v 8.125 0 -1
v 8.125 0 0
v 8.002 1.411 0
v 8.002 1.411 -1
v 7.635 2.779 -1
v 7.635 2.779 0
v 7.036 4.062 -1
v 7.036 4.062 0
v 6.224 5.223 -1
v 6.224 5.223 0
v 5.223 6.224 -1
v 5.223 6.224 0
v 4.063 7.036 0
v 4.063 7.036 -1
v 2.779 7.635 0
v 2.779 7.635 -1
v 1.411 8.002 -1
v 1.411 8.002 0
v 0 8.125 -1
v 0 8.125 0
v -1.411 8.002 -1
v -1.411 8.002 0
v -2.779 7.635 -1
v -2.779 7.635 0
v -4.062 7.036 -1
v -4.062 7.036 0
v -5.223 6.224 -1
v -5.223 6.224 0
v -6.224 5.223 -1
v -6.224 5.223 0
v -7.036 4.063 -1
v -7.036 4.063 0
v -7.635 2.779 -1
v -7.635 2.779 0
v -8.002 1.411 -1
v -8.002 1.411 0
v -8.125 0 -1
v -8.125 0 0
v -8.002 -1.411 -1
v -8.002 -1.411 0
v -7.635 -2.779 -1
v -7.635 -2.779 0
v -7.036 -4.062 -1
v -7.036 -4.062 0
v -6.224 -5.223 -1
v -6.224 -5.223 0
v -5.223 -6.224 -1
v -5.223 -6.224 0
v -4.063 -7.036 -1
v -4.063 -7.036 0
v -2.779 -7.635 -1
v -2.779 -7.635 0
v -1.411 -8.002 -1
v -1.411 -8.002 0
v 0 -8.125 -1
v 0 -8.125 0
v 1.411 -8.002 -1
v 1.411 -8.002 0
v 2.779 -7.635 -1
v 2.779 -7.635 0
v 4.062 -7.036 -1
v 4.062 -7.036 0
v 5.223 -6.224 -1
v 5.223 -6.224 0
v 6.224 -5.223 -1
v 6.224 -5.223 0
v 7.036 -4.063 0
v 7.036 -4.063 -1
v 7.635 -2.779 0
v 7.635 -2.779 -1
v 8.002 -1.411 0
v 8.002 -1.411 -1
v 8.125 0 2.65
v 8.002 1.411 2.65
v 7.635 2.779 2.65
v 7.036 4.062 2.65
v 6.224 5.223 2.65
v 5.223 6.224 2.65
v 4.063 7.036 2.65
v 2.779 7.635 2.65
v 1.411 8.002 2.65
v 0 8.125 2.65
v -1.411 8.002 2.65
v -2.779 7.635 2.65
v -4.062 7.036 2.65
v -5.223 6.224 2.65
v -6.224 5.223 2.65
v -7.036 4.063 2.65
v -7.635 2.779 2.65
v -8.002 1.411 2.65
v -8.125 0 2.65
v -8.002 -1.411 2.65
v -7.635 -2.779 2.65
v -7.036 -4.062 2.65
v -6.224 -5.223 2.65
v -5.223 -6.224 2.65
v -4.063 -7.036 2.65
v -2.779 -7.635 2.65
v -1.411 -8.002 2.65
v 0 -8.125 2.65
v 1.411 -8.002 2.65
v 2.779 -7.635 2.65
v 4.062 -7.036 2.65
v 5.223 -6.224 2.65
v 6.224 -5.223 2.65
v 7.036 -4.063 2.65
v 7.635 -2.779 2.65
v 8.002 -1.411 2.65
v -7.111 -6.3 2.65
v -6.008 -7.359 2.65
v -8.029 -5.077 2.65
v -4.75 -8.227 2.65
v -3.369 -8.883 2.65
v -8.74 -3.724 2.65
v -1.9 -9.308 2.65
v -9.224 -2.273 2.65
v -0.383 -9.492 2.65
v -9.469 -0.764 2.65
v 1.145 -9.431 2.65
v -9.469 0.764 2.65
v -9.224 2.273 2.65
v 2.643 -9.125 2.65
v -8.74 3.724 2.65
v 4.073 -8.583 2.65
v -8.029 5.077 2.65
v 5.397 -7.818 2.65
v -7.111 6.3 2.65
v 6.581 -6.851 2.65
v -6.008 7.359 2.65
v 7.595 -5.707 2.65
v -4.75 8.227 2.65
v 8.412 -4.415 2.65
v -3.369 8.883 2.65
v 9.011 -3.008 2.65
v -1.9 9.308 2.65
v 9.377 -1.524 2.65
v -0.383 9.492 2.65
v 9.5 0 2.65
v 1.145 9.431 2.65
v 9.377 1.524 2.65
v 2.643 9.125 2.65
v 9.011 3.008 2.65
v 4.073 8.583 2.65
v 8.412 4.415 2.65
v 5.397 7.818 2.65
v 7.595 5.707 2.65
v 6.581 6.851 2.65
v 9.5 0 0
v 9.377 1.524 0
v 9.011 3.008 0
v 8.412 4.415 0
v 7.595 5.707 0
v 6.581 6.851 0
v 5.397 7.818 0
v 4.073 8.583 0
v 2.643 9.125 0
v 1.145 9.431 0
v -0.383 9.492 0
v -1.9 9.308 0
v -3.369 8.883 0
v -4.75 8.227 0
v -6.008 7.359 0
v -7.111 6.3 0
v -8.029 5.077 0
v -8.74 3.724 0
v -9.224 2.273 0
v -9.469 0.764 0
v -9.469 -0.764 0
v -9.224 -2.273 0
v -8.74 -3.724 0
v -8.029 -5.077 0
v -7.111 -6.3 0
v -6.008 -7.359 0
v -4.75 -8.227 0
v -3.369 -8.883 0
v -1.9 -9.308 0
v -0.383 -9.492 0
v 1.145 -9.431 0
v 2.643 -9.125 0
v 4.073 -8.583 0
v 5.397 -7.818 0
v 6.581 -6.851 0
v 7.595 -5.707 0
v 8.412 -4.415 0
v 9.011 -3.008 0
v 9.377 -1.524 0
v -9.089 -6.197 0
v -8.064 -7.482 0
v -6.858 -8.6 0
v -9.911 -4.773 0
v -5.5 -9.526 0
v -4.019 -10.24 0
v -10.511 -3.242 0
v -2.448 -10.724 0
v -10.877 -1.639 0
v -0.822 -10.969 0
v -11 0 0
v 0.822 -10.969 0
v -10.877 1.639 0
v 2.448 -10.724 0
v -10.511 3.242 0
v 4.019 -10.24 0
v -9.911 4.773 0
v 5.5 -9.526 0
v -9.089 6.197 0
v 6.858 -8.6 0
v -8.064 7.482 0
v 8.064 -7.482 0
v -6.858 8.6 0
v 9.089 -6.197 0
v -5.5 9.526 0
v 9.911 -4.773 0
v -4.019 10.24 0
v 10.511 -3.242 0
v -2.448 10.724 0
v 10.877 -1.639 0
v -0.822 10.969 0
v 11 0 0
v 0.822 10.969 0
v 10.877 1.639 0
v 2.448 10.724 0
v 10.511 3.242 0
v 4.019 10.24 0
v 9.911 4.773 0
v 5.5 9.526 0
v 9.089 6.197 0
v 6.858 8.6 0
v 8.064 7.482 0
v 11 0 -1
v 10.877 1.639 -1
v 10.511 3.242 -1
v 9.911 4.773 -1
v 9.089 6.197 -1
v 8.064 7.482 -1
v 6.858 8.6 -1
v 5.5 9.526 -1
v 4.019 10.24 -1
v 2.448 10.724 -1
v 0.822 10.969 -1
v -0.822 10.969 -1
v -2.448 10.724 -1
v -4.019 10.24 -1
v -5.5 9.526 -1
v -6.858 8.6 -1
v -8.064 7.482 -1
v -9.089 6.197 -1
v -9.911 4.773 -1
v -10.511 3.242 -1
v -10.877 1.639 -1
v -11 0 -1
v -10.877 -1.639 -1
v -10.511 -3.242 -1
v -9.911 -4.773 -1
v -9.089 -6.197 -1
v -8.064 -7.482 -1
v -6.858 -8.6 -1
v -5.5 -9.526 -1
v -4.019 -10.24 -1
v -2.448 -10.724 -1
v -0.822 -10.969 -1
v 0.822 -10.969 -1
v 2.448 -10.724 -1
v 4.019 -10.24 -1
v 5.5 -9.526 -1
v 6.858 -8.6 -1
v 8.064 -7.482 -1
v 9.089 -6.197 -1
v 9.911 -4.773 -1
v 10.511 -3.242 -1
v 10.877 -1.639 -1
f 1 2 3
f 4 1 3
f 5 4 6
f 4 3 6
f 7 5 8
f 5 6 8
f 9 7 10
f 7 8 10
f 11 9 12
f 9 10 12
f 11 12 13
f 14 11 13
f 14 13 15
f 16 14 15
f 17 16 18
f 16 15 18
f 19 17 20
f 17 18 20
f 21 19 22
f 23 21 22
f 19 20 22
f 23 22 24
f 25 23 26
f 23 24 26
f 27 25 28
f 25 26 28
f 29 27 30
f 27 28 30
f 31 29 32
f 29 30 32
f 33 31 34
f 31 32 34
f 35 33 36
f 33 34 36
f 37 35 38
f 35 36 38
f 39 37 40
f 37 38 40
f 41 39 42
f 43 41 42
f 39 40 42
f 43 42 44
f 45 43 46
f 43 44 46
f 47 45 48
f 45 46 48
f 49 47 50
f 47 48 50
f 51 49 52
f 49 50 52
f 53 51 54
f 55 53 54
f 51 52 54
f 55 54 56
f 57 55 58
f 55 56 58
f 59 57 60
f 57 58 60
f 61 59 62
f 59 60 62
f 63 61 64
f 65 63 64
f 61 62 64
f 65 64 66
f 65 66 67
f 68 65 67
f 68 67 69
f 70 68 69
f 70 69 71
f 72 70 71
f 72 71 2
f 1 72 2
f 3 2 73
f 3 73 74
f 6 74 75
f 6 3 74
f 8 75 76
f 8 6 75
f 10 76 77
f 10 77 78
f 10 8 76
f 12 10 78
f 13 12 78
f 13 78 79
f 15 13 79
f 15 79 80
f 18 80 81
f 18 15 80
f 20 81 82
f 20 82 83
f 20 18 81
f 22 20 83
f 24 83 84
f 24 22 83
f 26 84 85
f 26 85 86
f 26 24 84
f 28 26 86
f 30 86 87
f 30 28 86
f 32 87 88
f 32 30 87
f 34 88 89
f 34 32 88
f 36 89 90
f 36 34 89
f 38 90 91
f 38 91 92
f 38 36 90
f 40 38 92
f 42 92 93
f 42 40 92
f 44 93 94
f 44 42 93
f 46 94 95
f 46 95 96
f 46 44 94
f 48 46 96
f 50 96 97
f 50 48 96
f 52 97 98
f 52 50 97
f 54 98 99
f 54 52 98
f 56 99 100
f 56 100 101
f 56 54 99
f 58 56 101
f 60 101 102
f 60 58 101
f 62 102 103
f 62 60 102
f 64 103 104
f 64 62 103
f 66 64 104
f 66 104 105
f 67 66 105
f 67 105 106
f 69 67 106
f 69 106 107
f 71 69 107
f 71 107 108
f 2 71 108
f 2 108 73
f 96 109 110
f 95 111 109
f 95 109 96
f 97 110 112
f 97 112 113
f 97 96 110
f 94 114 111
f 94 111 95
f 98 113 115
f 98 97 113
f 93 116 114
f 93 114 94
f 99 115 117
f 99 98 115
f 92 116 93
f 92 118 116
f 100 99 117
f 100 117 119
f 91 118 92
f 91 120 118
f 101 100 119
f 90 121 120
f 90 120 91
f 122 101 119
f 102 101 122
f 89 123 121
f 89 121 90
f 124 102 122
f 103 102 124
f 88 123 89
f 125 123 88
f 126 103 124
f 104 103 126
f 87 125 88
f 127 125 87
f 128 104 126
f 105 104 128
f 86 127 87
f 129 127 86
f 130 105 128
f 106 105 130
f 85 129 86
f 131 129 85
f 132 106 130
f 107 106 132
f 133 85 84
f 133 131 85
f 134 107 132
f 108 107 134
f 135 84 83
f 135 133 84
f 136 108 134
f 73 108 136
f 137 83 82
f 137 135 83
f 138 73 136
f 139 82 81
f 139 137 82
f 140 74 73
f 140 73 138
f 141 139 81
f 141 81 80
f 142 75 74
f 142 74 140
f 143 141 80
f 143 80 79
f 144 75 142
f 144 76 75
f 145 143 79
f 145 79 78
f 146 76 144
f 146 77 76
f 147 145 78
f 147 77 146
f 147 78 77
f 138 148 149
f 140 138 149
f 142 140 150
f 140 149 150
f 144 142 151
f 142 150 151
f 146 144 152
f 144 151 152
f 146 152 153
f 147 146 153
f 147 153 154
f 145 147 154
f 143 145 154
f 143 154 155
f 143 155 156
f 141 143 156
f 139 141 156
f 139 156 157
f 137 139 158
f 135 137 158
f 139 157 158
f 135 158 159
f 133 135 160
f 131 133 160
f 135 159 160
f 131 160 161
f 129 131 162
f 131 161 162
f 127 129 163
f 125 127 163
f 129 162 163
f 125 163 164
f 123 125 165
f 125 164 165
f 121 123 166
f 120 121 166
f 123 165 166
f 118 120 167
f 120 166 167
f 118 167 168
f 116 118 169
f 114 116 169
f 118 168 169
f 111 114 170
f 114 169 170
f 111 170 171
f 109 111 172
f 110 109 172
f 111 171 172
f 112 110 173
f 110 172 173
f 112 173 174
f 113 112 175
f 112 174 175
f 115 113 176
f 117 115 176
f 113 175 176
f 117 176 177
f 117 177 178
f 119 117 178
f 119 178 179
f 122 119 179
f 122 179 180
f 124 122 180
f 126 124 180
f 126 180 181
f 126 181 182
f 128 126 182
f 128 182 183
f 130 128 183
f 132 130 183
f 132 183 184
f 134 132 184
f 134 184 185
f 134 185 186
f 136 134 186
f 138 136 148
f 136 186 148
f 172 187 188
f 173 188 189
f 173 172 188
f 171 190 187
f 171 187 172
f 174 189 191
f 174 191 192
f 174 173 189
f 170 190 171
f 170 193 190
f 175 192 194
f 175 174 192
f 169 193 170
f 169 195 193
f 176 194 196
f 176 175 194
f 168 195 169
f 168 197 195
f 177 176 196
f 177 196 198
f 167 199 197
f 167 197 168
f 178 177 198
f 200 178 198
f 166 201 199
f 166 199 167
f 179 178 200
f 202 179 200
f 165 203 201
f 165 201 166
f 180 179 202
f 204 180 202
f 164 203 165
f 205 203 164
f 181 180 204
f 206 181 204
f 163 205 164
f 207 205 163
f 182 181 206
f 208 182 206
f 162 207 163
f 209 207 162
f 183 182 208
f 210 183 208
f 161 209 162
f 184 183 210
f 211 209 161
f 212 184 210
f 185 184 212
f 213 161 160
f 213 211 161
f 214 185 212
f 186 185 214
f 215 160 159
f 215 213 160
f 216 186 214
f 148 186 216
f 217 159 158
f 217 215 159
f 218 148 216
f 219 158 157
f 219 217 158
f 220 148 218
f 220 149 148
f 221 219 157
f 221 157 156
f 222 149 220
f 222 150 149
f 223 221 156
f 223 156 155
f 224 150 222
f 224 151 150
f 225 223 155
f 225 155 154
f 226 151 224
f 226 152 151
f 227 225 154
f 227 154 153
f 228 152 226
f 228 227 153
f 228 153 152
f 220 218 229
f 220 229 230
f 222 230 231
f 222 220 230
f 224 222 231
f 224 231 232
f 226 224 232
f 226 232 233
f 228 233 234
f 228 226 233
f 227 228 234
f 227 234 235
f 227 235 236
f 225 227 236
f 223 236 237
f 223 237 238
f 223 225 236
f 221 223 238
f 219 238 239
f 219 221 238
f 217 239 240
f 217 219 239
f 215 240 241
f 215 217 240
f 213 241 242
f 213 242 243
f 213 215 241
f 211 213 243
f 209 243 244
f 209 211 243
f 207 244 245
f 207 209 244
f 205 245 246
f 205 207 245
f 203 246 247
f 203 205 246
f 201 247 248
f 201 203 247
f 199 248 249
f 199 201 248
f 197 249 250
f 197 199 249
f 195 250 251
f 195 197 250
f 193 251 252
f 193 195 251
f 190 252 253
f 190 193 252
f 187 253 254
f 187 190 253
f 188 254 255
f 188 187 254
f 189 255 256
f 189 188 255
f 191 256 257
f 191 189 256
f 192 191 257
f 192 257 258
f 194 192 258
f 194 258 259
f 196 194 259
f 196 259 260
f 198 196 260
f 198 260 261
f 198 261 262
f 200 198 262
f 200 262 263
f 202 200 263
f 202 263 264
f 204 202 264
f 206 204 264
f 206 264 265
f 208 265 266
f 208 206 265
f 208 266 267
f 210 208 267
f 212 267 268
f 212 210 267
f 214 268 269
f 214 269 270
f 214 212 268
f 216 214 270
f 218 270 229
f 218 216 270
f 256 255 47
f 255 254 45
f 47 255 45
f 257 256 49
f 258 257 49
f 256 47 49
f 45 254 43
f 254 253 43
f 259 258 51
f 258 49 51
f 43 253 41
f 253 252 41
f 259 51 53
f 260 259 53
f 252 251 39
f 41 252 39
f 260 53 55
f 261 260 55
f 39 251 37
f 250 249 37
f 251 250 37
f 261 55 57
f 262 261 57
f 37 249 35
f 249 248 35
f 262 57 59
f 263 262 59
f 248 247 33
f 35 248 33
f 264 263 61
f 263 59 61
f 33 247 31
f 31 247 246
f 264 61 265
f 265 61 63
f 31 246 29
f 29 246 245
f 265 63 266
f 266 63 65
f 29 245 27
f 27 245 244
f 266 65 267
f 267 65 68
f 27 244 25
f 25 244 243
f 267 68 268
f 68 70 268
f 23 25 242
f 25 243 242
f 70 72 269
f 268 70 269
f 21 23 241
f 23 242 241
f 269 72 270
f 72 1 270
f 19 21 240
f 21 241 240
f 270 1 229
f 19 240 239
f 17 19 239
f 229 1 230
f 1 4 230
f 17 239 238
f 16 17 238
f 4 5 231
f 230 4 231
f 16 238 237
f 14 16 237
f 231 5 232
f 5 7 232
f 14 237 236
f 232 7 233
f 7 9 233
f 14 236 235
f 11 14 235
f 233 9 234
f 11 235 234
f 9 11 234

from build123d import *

# Parameters (mm, degrees)
F0_R     = 9.5
F0_R_2   = 8.125
F1_DEPTH = 2.65
F0_R_3   = 11
F2_DEPTH = 1


with BuildPart() as f1:
    # F0 (on Top) → F1 (new body)
    with BuildSketch(Plane.XY):
        Circle(F0_R)
        Circle(F0_R_2, mode=Mode.SUBTRACT)
    extrude(amount=F1_DEPTH)

    # F0 (on Top) → F2 (join)
    with BuildSketch(Plane.XY):
        Circle(F0_R_3)
        Circle(F0_R, mode=Mode.SUBTRACT)
        Circle(F0_R)
        Circle(F0_R_2, mode=Mode.SUBTRACT)
    extrude(amount=-F2_DEPTH)


solid = f1.part
